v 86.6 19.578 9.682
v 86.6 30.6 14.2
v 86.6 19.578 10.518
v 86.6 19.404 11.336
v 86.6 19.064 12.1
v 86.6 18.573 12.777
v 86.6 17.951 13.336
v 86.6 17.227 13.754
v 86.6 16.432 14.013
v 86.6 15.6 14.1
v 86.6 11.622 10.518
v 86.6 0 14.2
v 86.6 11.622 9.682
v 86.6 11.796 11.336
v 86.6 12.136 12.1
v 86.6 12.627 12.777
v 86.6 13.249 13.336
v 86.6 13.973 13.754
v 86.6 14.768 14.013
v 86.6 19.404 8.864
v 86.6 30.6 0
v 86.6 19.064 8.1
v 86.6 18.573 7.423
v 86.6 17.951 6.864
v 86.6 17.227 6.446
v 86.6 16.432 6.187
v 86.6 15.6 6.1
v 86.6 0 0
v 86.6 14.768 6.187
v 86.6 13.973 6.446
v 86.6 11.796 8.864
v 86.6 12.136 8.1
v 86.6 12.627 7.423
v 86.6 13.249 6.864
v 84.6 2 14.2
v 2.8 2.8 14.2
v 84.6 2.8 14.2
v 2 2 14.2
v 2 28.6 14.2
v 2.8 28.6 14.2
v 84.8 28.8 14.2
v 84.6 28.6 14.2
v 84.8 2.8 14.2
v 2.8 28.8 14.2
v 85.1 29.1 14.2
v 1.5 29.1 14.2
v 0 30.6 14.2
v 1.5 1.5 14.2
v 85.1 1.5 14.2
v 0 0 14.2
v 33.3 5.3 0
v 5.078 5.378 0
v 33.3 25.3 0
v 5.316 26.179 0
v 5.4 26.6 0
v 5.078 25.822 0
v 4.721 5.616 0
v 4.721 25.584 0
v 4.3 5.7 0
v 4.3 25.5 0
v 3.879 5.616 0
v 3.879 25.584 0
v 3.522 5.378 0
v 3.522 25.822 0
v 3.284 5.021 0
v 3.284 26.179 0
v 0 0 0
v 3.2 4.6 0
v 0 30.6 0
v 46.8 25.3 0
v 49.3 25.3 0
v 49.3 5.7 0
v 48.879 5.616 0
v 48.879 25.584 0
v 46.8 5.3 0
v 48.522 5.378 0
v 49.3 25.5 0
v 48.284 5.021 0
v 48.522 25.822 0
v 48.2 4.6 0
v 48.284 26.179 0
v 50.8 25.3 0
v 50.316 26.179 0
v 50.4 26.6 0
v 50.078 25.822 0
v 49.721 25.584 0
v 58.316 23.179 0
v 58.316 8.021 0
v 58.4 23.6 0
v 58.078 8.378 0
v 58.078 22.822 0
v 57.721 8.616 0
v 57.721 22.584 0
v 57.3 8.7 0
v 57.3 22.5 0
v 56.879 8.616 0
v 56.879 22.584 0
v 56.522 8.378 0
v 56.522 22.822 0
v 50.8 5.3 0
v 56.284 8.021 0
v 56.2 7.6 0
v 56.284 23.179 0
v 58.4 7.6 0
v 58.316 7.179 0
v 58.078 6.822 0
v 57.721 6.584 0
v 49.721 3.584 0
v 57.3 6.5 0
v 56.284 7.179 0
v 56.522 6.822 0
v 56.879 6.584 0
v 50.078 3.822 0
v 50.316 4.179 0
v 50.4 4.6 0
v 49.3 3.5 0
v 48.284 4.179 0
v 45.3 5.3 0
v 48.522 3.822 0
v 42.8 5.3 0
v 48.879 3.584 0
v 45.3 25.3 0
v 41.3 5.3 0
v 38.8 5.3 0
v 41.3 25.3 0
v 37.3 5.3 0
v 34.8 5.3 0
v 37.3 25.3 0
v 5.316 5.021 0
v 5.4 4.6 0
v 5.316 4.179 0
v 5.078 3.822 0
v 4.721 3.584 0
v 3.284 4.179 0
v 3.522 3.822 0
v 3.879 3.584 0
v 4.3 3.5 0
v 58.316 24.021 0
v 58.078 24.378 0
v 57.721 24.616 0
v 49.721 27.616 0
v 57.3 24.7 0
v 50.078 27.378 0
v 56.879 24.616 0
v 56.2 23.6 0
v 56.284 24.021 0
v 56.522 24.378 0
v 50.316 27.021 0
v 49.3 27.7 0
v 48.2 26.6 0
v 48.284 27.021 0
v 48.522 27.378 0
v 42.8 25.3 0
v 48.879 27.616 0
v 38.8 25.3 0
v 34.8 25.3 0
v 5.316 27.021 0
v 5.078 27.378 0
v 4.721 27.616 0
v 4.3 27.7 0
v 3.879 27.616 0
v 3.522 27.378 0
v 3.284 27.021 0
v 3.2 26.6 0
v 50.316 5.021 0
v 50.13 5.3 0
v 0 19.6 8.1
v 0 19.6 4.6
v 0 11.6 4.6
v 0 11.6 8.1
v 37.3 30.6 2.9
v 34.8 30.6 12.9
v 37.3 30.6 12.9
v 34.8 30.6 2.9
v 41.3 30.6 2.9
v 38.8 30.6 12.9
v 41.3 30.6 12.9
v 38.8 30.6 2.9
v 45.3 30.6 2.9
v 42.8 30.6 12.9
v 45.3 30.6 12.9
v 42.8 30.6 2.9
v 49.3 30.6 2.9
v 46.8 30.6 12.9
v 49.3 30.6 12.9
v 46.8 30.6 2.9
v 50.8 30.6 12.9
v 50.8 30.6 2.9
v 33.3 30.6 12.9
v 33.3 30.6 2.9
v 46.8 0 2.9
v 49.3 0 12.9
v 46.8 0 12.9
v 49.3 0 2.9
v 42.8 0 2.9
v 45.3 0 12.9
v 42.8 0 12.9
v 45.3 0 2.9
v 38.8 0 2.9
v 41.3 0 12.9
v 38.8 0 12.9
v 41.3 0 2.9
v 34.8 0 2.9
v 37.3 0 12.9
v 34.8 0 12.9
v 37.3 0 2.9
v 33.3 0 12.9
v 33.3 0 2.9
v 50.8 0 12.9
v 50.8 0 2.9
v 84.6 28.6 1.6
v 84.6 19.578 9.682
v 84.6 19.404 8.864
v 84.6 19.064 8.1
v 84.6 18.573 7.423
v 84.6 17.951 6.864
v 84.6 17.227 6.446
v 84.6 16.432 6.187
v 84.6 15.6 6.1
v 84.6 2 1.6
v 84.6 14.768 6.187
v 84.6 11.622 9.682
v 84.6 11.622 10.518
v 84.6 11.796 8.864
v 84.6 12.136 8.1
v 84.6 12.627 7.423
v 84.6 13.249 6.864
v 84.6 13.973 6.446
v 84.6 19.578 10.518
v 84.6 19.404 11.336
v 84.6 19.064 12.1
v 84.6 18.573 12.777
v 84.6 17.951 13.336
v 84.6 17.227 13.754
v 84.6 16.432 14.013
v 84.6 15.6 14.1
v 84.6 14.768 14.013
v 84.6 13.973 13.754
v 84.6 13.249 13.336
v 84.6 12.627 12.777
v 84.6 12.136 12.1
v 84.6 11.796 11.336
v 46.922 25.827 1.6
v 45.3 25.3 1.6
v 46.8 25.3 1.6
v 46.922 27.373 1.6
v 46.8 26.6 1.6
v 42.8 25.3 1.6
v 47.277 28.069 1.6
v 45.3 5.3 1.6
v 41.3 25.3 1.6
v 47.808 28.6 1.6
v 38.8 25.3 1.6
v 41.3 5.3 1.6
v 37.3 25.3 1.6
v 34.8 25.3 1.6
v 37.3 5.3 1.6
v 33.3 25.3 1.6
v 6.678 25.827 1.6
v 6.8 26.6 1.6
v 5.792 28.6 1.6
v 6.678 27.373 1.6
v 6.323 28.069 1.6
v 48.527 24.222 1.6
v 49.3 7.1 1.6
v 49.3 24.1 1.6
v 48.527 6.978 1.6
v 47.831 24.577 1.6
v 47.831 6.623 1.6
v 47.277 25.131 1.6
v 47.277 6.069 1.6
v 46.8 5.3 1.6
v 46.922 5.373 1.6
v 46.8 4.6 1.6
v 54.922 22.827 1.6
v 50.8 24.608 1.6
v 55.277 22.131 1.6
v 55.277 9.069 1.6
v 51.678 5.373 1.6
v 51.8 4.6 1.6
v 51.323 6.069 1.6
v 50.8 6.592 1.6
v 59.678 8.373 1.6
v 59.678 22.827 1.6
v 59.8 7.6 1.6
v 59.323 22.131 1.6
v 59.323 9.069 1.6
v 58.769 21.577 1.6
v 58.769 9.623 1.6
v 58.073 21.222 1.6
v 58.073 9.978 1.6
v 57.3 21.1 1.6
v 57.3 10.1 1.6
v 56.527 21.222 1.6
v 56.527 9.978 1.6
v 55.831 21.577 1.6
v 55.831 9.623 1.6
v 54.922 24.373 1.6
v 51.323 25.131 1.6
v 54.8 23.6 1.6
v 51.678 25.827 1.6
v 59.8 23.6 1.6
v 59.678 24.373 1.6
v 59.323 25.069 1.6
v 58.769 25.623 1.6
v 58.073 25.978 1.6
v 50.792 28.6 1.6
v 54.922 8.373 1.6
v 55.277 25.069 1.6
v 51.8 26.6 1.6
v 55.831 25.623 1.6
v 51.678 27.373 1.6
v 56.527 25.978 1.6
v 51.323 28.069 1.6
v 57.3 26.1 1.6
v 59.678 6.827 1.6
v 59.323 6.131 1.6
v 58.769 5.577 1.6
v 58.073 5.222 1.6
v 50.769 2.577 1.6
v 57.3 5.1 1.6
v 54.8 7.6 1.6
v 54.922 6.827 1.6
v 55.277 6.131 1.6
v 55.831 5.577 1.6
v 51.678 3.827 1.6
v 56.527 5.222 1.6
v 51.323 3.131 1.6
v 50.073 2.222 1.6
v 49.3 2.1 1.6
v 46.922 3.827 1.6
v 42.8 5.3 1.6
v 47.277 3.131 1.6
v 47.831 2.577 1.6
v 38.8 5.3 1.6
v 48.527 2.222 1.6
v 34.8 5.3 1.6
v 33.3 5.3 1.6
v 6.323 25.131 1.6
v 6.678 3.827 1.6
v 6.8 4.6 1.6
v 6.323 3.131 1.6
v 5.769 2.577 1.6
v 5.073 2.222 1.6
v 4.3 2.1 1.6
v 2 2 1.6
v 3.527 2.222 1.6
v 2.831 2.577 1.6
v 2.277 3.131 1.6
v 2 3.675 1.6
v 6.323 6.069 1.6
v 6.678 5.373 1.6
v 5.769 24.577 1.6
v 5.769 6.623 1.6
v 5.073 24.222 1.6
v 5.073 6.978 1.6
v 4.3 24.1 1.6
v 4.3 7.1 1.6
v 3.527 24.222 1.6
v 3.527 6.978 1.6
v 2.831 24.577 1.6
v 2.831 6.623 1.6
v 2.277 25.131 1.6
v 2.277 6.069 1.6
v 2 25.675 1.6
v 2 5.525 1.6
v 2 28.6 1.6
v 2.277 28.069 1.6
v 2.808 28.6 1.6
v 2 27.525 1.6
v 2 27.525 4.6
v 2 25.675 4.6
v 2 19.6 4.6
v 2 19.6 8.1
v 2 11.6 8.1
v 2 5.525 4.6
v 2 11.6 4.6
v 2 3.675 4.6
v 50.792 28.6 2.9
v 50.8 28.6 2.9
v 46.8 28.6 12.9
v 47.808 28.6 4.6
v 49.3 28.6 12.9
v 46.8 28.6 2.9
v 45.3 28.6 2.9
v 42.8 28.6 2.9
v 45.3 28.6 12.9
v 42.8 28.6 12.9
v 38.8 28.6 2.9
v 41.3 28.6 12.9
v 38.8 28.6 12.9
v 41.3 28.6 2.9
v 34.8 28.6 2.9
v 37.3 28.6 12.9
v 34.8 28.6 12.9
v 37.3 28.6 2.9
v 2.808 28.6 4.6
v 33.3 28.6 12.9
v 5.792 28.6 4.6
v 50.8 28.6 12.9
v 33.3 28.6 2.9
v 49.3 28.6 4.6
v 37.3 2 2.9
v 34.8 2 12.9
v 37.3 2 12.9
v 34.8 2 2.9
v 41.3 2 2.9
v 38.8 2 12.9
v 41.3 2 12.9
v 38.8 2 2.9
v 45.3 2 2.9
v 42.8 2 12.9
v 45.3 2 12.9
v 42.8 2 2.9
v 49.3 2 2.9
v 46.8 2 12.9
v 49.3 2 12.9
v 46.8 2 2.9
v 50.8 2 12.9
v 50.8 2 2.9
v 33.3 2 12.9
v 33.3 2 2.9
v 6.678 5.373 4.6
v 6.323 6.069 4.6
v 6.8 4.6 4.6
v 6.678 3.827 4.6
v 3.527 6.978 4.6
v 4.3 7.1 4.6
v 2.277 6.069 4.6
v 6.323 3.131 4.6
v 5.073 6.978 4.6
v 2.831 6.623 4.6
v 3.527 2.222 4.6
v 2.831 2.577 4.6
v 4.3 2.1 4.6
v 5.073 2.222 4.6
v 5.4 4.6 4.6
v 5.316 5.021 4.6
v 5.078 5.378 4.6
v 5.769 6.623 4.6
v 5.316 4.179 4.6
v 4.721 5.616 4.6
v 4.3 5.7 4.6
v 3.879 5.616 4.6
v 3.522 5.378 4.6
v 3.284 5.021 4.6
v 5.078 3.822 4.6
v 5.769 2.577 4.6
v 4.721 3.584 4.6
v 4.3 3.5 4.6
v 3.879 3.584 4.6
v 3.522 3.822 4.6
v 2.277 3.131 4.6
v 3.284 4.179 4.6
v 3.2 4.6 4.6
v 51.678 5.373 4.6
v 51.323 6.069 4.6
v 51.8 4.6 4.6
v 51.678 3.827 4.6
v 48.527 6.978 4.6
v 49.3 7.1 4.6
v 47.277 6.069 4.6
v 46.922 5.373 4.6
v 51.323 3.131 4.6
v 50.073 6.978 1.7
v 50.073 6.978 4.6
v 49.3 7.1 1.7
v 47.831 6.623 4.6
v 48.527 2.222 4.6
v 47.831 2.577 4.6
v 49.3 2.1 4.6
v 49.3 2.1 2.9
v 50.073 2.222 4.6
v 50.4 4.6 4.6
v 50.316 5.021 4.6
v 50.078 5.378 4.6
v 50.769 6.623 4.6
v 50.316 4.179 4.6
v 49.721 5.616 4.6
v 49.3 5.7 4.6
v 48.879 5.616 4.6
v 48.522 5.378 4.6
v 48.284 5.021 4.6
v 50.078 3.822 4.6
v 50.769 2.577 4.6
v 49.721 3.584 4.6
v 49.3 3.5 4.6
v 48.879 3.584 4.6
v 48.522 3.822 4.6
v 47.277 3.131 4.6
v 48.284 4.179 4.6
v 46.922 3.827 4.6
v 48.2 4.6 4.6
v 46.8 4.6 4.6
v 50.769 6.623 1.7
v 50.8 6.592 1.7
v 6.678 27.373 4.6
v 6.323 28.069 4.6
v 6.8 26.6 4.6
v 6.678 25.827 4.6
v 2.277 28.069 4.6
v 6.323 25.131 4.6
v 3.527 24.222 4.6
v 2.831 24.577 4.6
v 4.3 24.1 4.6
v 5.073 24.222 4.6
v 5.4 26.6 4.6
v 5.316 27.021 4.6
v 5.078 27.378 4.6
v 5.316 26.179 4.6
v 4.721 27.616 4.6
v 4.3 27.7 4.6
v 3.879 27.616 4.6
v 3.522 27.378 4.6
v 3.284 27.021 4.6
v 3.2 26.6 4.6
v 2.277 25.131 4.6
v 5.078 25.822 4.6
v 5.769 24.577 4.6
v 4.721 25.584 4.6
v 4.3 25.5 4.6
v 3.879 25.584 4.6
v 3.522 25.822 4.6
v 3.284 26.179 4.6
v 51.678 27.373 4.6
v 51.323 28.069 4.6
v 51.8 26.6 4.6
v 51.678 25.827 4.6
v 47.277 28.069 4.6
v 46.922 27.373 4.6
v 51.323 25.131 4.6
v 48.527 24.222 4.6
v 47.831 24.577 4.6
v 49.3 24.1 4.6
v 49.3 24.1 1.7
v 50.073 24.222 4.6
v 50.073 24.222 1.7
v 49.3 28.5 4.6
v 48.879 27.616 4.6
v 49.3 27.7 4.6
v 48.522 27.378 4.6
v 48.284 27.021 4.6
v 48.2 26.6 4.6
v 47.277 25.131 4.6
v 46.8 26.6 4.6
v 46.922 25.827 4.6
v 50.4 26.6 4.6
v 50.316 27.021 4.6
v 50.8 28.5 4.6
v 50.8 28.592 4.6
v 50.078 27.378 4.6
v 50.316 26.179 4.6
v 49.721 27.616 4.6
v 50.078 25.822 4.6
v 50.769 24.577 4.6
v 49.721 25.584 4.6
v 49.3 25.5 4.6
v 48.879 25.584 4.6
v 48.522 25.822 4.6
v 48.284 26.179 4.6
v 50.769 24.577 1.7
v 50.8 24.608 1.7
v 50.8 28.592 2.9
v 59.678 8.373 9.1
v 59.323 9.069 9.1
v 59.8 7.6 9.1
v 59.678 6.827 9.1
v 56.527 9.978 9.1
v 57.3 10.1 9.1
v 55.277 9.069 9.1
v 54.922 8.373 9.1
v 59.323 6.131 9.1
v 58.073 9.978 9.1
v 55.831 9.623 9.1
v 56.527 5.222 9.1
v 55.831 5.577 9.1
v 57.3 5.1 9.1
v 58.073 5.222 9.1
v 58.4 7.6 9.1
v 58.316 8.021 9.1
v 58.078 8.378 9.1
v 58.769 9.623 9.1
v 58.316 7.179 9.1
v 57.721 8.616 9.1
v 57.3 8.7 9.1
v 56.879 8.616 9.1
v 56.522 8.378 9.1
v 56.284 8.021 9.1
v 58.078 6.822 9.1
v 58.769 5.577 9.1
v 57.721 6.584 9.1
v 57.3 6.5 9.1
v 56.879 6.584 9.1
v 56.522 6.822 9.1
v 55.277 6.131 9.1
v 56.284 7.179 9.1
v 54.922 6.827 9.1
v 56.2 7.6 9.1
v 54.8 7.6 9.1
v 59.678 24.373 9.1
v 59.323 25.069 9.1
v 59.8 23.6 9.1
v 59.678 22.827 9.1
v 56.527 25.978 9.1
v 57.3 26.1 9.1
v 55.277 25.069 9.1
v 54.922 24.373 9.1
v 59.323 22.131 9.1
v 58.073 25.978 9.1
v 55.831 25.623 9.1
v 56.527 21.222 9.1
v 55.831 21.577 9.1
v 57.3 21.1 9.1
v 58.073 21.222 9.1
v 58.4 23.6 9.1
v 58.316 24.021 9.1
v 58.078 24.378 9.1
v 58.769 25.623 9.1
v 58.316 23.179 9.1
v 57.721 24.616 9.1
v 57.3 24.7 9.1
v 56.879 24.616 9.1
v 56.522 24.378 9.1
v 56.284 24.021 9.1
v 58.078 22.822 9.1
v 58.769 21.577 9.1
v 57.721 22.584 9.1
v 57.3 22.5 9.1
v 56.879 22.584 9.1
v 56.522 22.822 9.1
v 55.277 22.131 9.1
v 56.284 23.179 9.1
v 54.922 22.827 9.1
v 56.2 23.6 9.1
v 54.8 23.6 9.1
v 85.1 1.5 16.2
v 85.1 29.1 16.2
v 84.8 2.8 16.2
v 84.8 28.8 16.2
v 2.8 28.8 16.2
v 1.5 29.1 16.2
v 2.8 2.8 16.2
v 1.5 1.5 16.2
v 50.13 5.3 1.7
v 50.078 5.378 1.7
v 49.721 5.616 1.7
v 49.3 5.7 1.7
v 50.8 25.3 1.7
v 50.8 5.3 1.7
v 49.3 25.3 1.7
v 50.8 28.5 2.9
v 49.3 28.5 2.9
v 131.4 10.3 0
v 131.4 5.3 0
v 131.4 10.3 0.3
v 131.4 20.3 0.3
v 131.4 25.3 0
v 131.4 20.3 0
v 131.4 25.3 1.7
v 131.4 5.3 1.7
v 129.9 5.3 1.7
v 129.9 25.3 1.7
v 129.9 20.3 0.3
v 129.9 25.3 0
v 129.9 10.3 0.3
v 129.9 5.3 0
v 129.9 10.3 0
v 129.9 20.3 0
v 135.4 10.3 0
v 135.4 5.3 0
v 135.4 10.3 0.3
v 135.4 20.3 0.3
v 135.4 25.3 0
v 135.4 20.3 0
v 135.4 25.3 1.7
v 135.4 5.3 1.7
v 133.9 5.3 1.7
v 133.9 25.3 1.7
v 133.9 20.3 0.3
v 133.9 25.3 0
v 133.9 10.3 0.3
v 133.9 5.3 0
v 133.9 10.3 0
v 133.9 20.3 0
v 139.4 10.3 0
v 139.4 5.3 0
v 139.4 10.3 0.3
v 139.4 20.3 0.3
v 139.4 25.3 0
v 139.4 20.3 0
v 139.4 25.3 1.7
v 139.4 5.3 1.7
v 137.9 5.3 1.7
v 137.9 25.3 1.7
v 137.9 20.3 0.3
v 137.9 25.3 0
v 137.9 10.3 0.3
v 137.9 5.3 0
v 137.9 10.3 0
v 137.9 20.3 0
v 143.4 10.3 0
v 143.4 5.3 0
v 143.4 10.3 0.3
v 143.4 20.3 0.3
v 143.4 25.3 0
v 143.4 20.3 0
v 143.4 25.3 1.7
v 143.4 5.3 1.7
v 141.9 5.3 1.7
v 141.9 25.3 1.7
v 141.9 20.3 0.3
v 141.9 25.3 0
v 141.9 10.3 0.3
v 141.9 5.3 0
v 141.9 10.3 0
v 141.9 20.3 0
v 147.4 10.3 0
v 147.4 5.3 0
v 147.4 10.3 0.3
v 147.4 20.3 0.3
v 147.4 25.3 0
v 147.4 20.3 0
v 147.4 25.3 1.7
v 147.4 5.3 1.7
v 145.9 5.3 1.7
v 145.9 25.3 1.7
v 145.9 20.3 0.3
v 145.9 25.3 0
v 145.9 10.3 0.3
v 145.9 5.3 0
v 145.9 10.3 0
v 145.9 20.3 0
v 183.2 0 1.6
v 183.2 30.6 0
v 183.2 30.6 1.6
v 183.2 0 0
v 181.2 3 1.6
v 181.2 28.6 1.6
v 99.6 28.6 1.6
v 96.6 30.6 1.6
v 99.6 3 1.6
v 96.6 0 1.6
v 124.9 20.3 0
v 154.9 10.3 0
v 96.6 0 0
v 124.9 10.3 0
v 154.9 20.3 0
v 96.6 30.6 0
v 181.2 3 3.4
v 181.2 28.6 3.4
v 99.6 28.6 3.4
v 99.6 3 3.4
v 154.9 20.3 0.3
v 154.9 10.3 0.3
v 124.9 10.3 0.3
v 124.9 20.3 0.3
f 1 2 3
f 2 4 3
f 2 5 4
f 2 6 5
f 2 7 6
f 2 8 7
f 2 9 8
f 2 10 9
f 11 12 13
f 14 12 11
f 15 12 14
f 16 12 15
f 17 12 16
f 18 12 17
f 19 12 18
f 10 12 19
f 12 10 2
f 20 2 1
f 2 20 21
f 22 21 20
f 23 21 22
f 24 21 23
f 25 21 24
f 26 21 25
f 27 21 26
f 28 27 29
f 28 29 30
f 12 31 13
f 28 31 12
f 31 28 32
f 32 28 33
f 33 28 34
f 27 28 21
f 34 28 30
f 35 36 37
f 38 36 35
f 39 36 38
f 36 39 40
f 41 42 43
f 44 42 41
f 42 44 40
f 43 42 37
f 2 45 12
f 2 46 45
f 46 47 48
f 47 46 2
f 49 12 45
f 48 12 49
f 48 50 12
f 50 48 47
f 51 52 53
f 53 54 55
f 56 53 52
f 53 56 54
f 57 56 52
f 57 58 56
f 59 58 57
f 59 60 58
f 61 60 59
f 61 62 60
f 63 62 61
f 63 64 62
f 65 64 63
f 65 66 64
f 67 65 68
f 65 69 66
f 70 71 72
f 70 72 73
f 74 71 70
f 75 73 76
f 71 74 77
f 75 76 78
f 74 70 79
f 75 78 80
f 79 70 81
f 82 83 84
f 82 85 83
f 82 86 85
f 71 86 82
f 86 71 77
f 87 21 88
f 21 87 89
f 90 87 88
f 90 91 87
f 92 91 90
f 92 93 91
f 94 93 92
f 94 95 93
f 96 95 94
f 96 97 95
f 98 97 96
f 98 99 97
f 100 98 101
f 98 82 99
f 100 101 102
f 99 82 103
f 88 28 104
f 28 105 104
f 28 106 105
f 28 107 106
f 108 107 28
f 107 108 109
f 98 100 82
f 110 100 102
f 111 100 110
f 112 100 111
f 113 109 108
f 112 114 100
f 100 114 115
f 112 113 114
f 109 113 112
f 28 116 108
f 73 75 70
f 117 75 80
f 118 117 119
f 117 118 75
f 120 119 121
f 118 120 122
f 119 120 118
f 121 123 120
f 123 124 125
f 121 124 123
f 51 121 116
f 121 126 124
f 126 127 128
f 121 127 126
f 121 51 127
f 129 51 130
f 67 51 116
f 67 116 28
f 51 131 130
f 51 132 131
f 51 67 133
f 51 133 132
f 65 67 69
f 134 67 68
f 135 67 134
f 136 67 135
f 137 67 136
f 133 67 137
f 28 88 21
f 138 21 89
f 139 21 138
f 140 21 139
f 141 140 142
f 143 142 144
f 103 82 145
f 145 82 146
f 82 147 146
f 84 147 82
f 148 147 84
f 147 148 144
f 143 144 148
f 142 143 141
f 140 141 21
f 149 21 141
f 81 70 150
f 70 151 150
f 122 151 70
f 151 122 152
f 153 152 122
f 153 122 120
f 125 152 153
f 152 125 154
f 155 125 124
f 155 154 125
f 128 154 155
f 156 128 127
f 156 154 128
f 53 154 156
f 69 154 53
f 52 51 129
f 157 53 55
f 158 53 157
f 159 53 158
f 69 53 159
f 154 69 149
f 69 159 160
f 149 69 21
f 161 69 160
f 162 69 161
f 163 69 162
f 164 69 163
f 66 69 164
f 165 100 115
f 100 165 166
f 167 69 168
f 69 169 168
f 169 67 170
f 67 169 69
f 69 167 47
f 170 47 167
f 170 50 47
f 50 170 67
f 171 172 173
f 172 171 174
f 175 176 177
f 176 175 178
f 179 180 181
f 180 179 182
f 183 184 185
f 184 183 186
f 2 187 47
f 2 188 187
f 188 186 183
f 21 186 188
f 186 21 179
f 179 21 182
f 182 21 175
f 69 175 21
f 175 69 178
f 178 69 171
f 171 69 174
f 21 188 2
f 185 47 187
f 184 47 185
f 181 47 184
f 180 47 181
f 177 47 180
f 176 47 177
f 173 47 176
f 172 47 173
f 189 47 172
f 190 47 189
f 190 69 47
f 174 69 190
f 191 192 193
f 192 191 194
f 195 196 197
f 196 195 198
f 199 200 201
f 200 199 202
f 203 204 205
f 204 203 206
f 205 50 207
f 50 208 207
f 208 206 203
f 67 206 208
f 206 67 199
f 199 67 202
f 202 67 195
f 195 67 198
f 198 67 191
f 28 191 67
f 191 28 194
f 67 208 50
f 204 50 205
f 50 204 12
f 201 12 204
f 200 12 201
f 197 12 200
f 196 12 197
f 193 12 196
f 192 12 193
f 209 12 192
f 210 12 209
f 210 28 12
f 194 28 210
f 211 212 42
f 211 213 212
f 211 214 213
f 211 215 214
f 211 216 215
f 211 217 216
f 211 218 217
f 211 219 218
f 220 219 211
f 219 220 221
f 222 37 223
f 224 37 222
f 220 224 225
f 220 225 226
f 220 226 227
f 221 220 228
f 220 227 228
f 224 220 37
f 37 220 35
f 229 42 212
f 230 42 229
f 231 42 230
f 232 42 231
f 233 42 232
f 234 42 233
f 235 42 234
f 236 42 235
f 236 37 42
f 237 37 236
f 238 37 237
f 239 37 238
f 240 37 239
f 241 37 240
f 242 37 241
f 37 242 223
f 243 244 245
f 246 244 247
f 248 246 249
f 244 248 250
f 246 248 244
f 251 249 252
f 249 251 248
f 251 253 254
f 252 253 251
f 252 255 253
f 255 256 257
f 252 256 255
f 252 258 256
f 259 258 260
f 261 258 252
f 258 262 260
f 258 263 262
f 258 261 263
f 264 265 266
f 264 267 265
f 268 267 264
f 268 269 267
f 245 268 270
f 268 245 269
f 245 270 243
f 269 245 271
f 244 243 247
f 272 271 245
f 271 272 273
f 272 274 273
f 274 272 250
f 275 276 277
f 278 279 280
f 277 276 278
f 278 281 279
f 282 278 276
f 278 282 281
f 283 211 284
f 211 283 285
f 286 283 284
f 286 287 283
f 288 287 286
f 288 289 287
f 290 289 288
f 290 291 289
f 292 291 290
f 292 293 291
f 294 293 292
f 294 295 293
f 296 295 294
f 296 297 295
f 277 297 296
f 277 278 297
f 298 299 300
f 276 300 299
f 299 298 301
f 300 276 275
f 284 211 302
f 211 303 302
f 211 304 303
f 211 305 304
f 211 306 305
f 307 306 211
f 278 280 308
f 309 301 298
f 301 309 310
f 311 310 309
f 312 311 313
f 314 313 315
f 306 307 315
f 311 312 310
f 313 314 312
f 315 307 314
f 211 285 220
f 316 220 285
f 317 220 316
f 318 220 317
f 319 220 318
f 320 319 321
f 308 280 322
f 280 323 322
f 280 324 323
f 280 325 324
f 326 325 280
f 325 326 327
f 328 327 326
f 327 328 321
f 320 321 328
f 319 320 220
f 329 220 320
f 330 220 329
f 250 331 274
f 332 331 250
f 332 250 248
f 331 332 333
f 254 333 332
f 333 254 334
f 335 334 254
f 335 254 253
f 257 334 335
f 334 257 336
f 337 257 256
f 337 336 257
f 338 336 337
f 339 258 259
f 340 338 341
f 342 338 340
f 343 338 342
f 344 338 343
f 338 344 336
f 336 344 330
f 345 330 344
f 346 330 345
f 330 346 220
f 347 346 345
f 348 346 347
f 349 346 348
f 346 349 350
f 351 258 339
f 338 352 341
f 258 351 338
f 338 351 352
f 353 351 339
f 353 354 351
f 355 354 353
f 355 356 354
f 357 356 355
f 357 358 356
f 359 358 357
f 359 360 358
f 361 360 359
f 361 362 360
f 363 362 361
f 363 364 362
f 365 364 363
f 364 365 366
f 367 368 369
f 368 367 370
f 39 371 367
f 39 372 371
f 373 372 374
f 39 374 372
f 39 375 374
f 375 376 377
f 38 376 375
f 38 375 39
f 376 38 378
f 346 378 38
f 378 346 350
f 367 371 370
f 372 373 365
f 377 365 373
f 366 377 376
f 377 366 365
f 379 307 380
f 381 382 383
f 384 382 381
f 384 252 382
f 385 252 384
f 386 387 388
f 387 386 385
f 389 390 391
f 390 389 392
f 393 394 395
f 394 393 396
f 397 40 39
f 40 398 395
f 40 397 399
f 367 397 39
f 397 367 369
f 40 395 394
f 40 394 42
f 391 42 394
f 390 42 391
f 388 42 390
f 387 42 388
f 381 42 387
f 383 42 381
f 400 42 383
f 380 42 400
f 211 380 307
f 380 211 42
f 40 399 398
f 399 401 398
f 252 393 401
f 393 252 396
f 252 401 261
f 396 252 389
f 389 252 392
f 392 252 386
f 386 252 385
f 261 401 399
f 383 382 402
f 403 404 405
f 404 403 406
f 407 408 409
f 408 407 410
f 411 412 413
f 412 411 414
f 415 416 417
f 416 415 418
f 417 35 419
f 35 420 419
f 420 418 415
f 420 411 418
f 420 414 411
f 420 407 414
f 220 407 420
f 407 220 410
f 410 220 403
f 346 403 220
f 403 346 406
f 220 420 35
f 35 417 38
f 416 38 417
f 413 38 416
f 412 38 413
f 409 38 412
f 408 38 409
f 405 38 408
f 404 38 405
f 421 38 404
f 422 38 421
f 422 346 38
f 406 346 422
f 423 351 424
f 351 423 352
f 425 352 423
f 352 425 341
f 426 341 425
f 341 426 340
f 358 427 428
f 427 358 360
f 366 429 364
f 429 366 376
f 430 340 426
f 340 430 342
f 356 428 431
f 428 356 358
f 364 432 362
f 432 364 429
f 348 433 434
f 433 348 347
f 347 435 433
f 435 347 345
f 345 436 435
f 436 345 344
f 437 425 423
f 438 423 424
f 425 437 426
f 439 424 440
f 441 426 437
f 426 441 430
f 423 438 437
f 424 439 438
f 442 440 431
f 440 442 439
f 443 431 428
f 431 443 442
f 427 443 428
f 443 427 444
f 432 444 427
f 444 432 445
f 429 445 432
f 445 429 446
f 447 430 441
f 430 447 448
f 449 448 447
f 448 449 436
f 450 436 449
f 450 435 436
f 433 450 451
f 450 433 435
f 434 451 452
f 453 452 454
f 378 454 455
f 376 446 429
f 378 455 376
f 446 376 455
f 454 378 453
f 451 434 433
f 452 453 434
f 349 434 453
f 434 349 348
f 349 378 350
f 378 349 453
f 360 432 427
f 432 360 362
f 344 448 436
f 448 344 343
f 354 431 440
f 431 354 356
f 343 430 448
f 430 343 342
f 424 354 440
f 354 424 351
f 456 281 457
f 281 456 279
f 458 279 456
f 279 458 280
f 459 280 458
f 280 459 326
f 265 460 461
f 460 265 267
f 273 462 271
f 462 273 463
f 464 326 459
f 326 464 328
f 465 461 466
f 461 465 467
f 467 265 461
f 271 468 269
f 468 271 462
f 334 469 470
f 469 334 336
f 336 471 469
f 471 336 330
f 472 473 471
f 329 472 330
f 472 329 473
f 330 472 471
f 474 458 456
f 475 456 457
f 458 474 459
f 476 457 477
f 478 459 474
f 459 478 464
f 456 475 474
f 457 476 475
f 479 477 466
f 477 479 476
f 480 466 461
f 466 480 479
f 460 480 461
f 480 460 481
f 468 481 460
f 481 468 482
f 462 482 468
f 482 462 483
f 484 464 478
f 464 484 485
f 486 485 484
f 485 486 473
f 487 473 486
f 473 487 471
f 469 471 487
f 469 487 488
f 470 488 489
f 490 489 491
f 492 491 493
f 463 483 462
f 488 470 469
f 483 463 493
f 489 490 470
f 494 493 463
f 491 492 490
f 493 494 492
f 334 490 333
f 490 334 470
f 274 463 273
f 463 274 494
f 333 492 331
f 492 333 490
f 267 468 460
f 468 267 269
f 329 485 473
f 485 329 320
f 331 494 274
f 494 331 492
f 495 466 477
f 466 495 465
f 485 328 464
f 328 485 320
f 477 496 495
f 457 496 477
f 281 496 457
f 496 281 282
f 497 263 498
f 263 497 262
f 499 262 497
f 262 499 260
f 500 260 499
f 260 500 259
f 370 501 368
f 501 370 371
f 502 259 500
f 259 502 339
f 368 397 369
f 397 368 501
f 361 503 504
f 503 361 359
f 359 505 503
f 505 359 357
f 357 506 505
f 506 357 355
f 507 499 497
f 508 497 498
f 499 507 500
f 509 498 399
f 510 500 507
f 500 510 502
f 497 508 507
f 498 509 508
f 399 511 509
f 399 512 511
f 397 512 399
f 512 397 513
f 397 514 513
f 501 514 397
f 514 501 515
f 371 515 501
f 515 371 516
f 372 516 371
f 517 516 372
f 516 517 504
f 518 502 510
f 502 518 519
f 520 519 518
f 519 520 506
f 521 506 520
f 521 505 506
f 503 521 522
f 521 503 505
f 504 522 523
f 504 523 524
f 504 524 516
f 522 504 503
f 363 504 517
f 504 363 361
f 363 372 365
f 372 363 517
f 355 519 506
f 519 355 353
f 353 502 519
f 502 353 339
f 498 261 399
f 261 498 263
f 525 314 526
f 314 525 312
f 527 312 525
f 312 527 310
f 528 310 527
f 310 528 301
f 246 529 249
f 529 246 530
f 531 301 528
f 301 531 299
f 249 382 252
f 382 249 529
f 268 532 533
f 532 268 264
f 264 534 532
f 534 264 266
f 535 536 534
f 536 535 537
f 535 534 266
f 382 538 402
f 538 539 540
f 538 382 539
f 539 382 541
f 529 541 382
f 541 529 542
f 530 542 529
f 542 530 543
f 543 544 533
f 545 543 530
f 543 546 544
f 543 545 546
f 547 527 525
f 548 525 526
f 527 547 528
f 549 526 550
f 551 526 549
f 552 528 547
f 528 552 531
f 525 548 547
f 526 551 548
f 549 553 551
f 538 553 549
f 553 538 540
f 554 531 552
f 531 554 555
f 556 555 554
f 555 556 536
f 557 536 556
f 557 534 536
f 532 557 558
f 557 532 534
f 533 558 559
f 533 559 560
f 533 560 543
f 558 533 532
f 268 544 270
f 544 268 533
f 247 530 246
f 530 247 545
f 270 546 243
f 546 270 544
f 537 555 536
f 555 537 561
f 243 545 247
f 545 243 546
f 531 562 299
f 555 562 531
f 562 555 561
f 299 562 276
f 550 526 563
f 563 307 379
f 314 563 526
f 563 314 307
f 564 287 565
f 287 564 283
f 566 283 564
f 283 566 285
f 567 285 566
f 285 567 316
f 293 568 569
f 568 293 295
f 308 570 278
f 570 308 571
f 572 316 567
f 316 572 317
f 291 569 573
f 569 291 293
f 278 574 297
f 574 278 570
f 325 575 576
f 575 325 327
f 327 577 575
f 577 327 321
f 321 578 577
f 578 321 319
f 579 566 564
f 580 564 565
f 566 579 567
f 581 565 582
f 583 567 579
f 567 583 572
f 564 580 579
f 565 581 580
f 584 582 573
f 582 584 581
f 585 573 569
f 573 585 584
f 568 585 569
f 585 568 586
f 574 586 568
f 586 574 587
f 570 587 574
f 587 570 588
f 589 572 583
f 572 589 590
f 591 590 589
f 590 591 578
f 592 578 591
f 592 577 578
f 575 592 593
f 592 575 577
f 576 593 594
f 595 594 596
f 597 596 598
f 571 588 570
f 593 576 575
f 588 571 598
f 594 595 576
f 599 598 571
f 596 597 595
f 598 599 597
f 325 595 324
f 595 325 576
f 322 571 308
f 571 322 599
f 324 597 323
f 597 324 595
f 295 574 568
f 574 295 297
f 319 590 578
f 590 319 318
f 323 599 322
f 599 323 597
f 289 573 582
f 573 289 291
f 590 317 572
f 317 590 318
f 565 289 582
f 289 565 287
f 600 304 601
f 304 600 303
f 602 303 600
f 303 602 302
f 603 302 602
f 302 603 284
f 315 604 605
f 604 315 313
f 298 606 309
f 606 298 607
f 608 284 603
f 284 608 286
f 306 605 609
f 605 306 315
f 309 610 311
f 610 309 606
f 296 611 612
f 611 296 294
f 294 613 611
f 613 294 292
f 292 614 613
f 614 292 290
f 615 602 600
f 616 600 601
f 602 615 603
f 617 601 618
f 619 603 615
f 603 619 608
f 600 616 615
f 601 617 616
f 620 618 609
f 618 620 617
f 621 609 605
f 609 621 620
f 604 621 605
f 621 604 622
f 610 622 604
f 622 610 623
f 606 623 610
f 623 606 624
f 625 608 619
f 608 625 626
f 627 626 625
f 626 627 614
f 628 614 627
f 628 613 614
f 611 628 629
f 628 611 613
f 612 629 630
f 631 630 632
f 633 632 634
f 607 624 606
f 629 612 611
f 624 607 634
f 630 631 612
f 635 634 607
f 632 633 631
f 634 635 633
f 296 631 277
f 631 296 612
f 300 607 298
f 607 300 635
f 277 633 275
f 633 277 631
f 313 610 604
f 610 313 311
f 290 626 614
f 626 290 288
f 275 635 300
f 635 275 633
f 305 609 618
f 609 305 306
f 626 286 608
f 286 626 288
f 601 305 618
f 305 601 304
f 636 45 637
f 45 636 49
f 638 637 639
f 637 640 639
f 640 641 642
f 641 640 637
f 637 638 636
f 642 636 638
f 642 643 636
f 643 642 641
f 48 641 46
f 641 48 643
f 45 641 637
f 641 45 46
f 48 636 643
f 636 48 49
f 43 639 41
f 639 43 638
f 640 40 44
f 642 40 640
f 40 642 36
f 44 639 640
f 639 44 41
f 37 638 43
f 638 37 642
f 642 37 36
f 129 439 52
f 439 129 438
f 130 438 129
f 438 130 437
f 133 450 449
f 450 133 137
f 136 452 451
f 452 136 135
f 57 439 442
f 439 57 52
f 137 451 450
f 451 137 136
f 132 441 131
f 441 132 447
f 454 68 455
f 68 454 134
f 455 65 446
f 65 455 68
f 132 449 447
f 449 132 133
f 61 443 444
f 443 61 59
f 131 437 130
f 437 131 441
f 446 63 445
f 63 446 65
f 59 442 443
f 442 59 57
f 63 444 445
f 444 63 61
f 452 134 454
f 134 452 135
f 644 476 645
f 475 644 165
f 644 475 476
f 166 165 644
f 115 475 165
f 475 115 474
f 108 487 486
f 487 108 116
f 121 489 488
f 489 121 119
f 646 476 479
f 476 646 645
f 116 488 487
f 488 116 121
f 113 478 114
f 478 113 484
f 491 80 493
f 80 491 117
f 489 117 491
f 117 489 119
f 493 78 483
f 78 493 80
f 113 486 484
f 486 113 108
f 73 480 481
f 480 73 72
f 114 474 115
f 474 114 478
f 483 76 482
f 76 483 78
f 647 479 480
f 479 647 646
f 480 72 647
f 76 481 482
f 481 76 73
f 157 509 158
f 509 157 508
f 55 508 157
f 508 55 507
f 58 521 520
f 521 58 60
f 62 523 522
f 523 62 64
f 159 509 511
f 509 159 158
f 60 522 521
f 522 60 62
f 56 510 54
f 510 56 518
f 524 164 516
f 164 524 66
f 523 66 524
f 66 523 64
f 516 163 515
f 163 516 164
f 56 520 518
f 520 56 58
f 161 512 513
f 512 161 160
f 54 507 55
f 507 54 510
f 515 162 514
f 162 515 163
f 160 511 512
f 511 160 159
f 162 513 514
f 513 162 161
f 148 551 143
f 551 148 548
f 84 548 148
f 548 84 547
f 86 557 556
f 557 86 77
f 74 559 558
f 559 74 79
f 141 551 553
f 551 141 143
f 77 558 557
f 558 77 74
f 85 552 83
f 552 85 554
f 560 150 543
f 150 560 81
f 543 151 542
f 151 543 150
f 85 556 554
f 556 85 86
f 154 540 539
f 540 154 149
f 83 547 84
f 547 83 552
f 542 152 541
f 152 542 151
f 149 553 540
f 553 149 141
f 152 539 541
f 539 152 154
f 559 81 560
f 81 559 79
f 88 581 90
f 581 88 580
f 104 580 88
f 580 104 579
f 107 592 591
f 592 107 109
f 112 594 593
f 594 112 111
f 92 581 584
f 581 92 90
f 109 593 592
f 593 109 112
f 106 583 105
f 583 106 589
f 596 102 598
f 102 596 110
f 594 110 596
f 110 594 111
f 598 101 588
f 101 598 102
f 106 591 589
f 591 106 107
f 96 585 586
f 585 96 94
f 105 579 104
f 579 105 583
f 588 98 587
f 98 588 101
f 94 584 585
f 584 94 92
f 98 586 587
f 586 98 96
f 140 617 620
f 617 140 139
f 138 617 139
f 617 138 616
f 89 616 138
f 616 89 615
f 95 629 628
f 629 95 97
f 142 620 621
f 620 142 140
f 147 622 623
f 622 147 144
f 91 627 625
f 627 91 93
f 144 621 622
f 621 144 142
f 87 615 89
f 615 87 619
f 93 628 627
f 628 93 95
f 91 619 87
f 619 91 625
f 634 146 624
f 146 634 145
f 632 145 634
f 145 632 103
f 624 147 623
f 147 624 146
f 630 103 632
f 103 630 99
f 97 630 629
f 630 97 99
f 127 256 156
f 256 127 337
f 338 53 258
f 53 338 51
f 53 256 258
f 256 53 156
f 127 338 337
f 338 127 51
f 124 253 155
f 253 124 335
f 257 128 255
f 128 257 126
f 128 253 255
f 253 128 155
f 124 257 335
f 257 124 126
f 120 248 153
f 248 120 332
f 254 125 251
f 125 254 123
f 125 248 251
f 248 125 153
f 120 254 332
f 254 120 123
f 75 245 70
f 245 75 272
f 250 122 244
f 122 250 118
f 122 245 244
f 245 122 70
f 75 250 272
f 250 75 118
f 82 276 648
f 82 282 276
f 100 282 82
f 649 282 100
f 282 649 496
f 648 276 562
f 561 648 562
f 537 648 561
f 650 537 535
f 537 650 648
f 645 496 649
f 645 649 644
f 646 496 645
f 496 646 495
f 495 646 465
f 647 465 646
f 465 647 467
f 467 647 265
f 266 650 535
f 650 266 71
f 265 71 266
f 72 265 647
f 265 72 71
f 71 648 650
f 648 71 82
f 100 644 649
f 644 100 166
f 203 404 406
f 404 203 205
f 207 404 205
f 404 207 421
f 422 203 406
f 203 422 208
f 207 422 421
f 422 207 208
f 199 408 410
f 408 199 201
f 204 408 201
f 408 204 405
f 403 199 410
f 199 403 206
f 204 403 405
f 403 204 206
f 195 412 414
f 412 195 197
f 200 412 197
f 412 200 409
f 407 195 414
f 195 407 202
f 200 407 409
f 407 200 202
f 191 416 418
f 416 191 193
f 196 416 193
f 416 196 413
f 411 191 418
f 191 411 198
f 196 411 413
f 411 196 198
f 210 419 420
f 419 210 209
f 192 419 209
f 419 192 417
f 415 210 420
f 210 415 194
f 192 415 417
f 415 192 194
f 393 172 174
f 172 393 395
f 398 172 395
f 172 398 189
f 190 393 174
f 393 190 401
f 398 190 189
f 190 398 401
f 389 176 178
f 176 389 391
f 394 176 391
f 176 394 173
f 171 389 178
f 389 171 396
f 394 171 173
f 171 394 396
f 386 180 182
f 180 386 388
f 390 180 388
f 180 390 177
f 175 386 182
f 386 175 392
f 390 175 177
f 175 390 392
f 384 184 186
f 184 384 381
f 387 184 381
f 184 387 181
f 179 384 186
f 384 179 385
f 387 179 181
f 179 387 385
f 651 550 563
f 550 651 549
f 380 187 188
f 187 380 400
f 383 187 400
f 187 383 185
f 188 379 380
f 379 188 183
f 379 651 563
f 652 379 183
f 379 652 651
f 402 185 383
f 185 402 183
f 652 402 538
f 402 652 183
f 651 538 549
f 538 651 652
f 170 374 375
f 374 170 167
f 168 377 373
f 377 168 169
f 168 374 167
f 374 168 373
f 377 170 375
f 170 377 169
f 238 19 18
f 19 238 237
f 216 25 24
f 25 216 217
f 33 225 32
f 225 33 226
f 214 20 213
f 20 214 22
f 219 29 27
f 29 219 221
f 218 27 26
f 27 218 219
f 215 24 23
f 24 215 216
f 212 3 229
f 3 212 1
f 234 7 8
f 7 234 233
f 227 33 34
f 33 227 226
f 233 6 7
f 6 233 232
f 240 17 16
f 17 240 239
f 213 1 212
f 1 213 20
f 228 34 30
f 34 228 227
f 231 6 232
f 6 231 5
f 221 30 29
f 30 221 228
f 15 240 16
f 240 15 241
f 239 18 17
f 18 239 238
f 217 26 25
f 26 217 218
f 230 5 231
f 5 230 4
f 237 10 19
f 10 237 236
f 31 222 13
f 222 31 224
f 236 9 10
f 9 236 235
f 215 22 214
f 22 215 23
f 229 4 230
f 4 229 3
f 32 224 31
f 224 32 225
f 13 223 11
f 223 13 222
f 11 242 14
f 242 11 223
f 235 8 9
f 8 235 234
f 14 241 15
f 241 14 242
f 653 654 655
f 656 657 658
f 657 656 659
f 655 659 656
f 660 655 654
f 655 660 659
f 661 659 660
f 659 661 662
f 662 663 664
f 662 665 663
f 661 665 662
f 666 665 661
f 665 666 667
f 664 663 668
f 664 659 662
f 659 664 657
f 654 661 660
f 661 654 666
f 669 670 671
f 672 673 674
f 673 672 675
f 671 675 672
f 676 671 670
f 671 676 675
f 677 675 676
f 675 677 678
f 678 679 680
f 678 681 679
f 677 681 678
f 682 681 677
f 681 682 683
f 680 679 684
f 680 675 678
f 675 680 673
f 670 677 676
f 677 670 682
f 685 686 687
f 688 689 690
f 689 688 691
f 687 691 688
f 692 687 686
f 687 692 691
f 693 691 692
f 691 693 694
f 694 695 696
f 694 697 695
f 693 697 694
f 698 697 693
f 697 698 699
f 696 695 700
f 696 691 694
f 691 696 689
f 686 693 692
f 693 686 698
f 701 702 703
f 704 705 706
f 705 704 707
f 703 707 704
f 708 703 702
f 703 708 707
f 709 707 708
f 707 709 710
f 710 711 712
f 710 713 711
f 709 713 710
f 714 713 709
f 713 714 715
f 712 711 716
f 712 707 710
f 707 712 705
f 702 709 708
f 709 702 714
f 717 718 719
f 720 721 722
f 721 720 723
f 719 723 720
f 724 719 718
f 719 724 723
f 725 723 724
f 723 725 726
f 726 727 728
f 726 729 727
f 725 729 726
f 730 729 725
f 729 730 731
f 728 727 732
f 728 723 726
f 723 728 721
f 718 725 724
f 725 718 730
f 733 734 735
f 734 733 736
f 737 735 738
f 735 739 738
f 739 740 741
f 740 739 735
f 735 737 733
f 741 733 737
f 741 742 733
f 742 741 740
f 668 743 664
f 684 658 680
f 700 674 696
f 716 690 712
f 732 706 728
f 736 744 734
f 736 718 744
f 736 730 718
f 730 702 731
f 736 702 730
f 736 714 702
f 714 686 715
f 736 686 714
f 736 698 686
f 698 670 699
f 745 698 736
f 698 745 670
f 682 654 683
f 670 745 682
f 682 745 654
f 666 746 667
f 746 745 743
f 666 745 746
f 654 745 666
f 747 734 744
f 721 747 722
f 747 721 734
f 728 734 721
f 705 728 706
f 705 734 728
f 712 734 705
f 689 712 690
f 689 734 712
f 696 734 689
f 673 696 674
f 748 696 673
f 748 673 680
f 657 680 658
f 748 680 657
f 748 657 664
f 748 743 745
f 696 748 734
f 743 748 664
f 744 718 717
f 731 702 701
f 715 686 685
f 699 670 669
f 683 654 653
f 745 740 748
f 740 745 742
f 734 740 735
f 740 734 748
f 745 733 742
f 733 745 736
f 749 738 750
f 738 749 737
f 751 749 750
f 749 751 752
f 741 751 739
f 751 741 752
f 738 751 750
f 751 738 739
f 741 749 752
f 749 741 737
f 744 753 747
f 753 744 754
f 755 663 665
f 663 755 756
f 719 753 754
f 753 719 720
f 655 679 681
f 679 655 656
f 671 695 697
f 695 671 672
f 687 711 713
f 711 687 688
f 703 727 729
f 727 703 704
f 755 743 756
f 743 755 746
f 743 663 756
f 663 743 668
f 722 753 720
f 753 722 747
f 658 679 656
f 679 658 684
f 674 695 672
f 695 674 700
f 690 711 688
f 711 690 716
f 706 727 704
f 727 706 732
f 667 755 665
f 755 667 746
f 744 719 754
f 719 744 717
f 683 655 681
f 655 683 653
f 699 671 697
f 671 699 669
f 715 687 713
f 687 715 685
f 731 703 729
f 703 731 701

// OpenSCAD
// =============================================================================
// Radio Controller Case — NodeMCU v2 + CC1101 (SMA antenna)
// 3D printable enclosure, no supports needed
// Print: bottom + lid separately, flat side down
// =============================================================================

// --- Tolerances & print settings ---
tol       = 0.3;    // printer tolerance (adjust for your printer)
wall      = 2.0;    // wall thickness
floor_t   = 1.6;    // floor/ceiling thickness
post_d    = 5.0;    // mounting post diameter
screw_d   = 2.2;    // M2 screw hole diameter
snap_gap  = 0.2;    // lid snap-fit clearance

// --- NodeMCU v2 dimensions ---
nmc_l     = 49.0;   // length (USB to antenna end)
nmc_w     = 26.0;   // width
nmc_h     = 10.0;   // height with pins soldered underneath
nmc_pcb_t = 1.6;    // PCB thickness
nmc_usb_w = 8.0;    // micro-USB connector width
nmc_usb_h = 3.5;    // micro-USB connector height

// --- CC1101 module dimensions ---
cc_l      = 29.0;   // length (SMA end to opposite)
cc_w      = 20.0;   // width
cc_h      = 3.5;    // height (tallest component on PCB)
cc_pcb_t  = 1.0;    // PCB thickness
sma_d     = 6.5;    // SMA connector diameter (nut flats ~8mm)
sma_hole  = 8.0;    // SMA hole in wall (clearance for nut)

// --- Internal layout ---
gap       = 4.0;    // gap between NodeMCU and CC1101
wire_ch   = 3.0;    // wire channel depth

// --- Computed internal dimensions ---
int_l     = nmc_l + gap + cc_l + 2*tol;
int_w     = max(nmc_w, cc_w) + 2*tol;
int_h     = nmc_h + 2 + 2*tol;   // +2 for clearance above tallest component

// --- Computed external dimensions ---
ext_l     = int_l + 2*wall;
ext_w     = int_w + 2*wall;
ext_h_bot = floor_t + int_h;      // bottom half height
ext_h_lid = floor_t + 3;          // lid height (shallow)
lip_h     = 2.0;                  // lid inner lip height

// --- Vent hole settings ---
vent_w    = 1.5;
vent_gap  = 2.5;
vent_n    = 5;

// --- NodeMCU position (USB end at -X wall) ---
nmc_x     = wall + tol;
nmc_y     = wall + tol + (int_w - nmc_w)/2;

// --- CC1101 position (SMA end at +X wall) ---
cc_x      = wall + tol + nmc_l + gap;
cc_y      = wall + tol + (int_w - cc_w)/2;

// --- Mounting post positions ---
// NodeMCU: 4 corner posts, inset 2mm from edges
nmc_post_inset = 2.0;
nmc_posts = [
    [nmc_x + nmc_post_inset,               nmc_y + nmc_post_inset],
    [nmc_x + nmc_l - nmc_post_inset,       nmc_y + nmc_post_inset],
    [nmc_x + nmc_post_inset,               nmc_y + nmc_w - nmc_post_inset],
    [nmc_x + nmc_l - nmc_post_inset,       nmc_y + nmc_w - nmc_post_inset],
];

// CC1101: 2 posts on the non-SMA end
cc_post_inset = 2.0;
cc_posts = [
    [cc_x + cc_post_inset,                 cc_y + cc_post_inset],
    [cc_x + cc_post_inset,                 cc_y + cc_w - cc_post_inset],
];


// =============================================================================
// BOTTOM HALF
// =============================================================================
module bottom() {
    difference() {
        union() {
            // Main box
            difference() {
                // Outer shell
                cube([ext_l, ext_w, ext_h_bot]);

                // Inner cavity
                translate([wall, wall, floor_t])
                    cube([int_l, int_w, int_h + 1]);
            }

            // Mounting posts for NodeMCU
            for (p = nmc_posts) {
                translate([p[0], p[1], floor_t])
                    cylinder(d=post_d, h=3, $fn=20);
            }

            // Mounting posts for CC1101
            for (p = cc_posts) {
                translate([p[0], p[1], floor_t])
                    cylinder(d=post_d, h=nmc_h - cc_h + 1, $fn=20);
            }

            // Lid alignment rim (inner lip for lid to sit on)
            difference() {
                translate([wall - 0.5, wall - 0.5, ext_h_bot])
                    cube([int_l + 1, int_w + 1, lip_h]);
                translate([wall + 0.8, wall + 0.8, ext_h_bot - 0.1])
                    cube([int_l - 0.6, int_w - 0.6, lip_h + 0.2]);
            }
        }

        // --- Cutouts ---

        // Micro-USB port (NodeMCU, -X wall)
        translate([-0.1, nmc_y + nmc_w/2 - nmc_usb_w/2, floor_t + 3])
            cube([wall + 0.2, nmc_usb_w, nmc_usb_h]);

        // SMA antenna hole (CC1101, +X wall)
        translate([ext_l - wall - 0.1, cc_y + cc_w/2, floor_t + nmc_h - cc_h + cc_pcb_t + 1])
            rotate([0, 90, 0])
                cylinder(d=sma_hole, h=wall + 0.2, $fn=30);

        // Screw holes in mounting posts
        for (p = nmc_posts) {
            translate([p[0], p[1], -0.1])
                cylinder(d=screw_d, h=floor_t + 4, $fn=16);
        }
        for (p = cc_posts) {
            translate([p[0], p[1], -0.1])
                cylinder(d=screw_d, h=floor_t + nmc_h, $fn=16);
        }

        // Bottom ventilation slots
        translate([ext_l/2 - (vent_n*(vent_w + vent_gap))/2, ext_w/2 - 10, -0.1])
            for (i = [0:vent_n-1])
                translate([i * (vent_w + vent_gap), 0, 0])
                    cube([vent_w, 20, floor_t + 0.2]);

        // Side ventilation slots (both long sides)
        for (side = [0, ext_w - wall]) {
            translate([ext_l/2 - (vent_n*(vent_w + vent_gap))/2, side - 0.1, floor_t + int_h/2 - 5])
                for (i = [0:vent_n-1])
                    translate([i * (vent_w + vent_gap), 0, 0])
                        cube([vent_w, wall + 0.2, 10]);
        }

        // Round the top edges (cosmetic chamfer)
        // (skipped for printability — add fillets in slicer if desired)
    }
}


// =============================================================================
// LID
// =============================================================================
module lid() {
    difference() {
        union() {
            // Top plate
            cube([ext_l, ext_w, floor_t]);

            // Inner lip that fits inside the bottom rim
            translate([wall + 0.8 + snap_gap, wall + 0.8 + snap_gap, floor_t])
                cube([int_l - 0.6 - 2*snap_gap, int_w - 0.6 - 2*snap_gap, lip_h - 0.2]);
        }

        // Top ventilation slots
        translate([ext_l/2 - (vent_n*(vent_w + vent_gap))/2, ext_w/2 - 10, -0.1])
            for (i = [0:vent_n-1])
                translate([i * (vent_w + vent_gap), 0, 0])
                    cube([vent_w, 20, floor_t + 0.2]);

        // Label recess (optional: for a printed label)
        translate([ext_l/2 - 15, ext_w/2 - 5, -0.1])
            cube([30, 10, 0.4]);
    }
}


// =============================================================================
// ASSEMBLY PREVIEW / PRINT LAYOUT
// =============================================================================

// Set to "preview" to see assembled, "print" for print layout
mode = "print";  // "preview" or "print"

if (mode == "preview") {
    // Assembled view
    color("DarkSlateGray") bottom();
    color("SlateGray", 0.5) translate([0, 0, ext_h_bot + lip_h + 5])
        lid();

    // Ghost boards for reference
    color("green", 0.3) translate([nmc_x, nmc_y, floor_t + 3])
        cube([nmc_l, nmc_w, nmc_pcb_t]);
    color("green", 0.3) translate([cc_x, cc_y, floor_t + nmc_h - cc_h + 1])
        cube([cc_l, cc_w, cc_pcb_t]);

} else {
    // Print layout — both parts flat, side by side
    bottom();
    translate([ext_l + 10, 0, 0])
        lid();
}


// =============================================================================
// DIMENSIONS (for reference)
// =============================================================================
// Uncomment to print dimensions to console:
// echo(str("External: ", ext_l, " x ", ext_w, " x ", ext_h_bot + floor_t + lip_h, " mm"));
// echo(str("Internal: ", int_l, " x ", int_w, " x ", int_h, " mm"));
// echo(str("Lid height: ", ext_h_lid, " mm"));
